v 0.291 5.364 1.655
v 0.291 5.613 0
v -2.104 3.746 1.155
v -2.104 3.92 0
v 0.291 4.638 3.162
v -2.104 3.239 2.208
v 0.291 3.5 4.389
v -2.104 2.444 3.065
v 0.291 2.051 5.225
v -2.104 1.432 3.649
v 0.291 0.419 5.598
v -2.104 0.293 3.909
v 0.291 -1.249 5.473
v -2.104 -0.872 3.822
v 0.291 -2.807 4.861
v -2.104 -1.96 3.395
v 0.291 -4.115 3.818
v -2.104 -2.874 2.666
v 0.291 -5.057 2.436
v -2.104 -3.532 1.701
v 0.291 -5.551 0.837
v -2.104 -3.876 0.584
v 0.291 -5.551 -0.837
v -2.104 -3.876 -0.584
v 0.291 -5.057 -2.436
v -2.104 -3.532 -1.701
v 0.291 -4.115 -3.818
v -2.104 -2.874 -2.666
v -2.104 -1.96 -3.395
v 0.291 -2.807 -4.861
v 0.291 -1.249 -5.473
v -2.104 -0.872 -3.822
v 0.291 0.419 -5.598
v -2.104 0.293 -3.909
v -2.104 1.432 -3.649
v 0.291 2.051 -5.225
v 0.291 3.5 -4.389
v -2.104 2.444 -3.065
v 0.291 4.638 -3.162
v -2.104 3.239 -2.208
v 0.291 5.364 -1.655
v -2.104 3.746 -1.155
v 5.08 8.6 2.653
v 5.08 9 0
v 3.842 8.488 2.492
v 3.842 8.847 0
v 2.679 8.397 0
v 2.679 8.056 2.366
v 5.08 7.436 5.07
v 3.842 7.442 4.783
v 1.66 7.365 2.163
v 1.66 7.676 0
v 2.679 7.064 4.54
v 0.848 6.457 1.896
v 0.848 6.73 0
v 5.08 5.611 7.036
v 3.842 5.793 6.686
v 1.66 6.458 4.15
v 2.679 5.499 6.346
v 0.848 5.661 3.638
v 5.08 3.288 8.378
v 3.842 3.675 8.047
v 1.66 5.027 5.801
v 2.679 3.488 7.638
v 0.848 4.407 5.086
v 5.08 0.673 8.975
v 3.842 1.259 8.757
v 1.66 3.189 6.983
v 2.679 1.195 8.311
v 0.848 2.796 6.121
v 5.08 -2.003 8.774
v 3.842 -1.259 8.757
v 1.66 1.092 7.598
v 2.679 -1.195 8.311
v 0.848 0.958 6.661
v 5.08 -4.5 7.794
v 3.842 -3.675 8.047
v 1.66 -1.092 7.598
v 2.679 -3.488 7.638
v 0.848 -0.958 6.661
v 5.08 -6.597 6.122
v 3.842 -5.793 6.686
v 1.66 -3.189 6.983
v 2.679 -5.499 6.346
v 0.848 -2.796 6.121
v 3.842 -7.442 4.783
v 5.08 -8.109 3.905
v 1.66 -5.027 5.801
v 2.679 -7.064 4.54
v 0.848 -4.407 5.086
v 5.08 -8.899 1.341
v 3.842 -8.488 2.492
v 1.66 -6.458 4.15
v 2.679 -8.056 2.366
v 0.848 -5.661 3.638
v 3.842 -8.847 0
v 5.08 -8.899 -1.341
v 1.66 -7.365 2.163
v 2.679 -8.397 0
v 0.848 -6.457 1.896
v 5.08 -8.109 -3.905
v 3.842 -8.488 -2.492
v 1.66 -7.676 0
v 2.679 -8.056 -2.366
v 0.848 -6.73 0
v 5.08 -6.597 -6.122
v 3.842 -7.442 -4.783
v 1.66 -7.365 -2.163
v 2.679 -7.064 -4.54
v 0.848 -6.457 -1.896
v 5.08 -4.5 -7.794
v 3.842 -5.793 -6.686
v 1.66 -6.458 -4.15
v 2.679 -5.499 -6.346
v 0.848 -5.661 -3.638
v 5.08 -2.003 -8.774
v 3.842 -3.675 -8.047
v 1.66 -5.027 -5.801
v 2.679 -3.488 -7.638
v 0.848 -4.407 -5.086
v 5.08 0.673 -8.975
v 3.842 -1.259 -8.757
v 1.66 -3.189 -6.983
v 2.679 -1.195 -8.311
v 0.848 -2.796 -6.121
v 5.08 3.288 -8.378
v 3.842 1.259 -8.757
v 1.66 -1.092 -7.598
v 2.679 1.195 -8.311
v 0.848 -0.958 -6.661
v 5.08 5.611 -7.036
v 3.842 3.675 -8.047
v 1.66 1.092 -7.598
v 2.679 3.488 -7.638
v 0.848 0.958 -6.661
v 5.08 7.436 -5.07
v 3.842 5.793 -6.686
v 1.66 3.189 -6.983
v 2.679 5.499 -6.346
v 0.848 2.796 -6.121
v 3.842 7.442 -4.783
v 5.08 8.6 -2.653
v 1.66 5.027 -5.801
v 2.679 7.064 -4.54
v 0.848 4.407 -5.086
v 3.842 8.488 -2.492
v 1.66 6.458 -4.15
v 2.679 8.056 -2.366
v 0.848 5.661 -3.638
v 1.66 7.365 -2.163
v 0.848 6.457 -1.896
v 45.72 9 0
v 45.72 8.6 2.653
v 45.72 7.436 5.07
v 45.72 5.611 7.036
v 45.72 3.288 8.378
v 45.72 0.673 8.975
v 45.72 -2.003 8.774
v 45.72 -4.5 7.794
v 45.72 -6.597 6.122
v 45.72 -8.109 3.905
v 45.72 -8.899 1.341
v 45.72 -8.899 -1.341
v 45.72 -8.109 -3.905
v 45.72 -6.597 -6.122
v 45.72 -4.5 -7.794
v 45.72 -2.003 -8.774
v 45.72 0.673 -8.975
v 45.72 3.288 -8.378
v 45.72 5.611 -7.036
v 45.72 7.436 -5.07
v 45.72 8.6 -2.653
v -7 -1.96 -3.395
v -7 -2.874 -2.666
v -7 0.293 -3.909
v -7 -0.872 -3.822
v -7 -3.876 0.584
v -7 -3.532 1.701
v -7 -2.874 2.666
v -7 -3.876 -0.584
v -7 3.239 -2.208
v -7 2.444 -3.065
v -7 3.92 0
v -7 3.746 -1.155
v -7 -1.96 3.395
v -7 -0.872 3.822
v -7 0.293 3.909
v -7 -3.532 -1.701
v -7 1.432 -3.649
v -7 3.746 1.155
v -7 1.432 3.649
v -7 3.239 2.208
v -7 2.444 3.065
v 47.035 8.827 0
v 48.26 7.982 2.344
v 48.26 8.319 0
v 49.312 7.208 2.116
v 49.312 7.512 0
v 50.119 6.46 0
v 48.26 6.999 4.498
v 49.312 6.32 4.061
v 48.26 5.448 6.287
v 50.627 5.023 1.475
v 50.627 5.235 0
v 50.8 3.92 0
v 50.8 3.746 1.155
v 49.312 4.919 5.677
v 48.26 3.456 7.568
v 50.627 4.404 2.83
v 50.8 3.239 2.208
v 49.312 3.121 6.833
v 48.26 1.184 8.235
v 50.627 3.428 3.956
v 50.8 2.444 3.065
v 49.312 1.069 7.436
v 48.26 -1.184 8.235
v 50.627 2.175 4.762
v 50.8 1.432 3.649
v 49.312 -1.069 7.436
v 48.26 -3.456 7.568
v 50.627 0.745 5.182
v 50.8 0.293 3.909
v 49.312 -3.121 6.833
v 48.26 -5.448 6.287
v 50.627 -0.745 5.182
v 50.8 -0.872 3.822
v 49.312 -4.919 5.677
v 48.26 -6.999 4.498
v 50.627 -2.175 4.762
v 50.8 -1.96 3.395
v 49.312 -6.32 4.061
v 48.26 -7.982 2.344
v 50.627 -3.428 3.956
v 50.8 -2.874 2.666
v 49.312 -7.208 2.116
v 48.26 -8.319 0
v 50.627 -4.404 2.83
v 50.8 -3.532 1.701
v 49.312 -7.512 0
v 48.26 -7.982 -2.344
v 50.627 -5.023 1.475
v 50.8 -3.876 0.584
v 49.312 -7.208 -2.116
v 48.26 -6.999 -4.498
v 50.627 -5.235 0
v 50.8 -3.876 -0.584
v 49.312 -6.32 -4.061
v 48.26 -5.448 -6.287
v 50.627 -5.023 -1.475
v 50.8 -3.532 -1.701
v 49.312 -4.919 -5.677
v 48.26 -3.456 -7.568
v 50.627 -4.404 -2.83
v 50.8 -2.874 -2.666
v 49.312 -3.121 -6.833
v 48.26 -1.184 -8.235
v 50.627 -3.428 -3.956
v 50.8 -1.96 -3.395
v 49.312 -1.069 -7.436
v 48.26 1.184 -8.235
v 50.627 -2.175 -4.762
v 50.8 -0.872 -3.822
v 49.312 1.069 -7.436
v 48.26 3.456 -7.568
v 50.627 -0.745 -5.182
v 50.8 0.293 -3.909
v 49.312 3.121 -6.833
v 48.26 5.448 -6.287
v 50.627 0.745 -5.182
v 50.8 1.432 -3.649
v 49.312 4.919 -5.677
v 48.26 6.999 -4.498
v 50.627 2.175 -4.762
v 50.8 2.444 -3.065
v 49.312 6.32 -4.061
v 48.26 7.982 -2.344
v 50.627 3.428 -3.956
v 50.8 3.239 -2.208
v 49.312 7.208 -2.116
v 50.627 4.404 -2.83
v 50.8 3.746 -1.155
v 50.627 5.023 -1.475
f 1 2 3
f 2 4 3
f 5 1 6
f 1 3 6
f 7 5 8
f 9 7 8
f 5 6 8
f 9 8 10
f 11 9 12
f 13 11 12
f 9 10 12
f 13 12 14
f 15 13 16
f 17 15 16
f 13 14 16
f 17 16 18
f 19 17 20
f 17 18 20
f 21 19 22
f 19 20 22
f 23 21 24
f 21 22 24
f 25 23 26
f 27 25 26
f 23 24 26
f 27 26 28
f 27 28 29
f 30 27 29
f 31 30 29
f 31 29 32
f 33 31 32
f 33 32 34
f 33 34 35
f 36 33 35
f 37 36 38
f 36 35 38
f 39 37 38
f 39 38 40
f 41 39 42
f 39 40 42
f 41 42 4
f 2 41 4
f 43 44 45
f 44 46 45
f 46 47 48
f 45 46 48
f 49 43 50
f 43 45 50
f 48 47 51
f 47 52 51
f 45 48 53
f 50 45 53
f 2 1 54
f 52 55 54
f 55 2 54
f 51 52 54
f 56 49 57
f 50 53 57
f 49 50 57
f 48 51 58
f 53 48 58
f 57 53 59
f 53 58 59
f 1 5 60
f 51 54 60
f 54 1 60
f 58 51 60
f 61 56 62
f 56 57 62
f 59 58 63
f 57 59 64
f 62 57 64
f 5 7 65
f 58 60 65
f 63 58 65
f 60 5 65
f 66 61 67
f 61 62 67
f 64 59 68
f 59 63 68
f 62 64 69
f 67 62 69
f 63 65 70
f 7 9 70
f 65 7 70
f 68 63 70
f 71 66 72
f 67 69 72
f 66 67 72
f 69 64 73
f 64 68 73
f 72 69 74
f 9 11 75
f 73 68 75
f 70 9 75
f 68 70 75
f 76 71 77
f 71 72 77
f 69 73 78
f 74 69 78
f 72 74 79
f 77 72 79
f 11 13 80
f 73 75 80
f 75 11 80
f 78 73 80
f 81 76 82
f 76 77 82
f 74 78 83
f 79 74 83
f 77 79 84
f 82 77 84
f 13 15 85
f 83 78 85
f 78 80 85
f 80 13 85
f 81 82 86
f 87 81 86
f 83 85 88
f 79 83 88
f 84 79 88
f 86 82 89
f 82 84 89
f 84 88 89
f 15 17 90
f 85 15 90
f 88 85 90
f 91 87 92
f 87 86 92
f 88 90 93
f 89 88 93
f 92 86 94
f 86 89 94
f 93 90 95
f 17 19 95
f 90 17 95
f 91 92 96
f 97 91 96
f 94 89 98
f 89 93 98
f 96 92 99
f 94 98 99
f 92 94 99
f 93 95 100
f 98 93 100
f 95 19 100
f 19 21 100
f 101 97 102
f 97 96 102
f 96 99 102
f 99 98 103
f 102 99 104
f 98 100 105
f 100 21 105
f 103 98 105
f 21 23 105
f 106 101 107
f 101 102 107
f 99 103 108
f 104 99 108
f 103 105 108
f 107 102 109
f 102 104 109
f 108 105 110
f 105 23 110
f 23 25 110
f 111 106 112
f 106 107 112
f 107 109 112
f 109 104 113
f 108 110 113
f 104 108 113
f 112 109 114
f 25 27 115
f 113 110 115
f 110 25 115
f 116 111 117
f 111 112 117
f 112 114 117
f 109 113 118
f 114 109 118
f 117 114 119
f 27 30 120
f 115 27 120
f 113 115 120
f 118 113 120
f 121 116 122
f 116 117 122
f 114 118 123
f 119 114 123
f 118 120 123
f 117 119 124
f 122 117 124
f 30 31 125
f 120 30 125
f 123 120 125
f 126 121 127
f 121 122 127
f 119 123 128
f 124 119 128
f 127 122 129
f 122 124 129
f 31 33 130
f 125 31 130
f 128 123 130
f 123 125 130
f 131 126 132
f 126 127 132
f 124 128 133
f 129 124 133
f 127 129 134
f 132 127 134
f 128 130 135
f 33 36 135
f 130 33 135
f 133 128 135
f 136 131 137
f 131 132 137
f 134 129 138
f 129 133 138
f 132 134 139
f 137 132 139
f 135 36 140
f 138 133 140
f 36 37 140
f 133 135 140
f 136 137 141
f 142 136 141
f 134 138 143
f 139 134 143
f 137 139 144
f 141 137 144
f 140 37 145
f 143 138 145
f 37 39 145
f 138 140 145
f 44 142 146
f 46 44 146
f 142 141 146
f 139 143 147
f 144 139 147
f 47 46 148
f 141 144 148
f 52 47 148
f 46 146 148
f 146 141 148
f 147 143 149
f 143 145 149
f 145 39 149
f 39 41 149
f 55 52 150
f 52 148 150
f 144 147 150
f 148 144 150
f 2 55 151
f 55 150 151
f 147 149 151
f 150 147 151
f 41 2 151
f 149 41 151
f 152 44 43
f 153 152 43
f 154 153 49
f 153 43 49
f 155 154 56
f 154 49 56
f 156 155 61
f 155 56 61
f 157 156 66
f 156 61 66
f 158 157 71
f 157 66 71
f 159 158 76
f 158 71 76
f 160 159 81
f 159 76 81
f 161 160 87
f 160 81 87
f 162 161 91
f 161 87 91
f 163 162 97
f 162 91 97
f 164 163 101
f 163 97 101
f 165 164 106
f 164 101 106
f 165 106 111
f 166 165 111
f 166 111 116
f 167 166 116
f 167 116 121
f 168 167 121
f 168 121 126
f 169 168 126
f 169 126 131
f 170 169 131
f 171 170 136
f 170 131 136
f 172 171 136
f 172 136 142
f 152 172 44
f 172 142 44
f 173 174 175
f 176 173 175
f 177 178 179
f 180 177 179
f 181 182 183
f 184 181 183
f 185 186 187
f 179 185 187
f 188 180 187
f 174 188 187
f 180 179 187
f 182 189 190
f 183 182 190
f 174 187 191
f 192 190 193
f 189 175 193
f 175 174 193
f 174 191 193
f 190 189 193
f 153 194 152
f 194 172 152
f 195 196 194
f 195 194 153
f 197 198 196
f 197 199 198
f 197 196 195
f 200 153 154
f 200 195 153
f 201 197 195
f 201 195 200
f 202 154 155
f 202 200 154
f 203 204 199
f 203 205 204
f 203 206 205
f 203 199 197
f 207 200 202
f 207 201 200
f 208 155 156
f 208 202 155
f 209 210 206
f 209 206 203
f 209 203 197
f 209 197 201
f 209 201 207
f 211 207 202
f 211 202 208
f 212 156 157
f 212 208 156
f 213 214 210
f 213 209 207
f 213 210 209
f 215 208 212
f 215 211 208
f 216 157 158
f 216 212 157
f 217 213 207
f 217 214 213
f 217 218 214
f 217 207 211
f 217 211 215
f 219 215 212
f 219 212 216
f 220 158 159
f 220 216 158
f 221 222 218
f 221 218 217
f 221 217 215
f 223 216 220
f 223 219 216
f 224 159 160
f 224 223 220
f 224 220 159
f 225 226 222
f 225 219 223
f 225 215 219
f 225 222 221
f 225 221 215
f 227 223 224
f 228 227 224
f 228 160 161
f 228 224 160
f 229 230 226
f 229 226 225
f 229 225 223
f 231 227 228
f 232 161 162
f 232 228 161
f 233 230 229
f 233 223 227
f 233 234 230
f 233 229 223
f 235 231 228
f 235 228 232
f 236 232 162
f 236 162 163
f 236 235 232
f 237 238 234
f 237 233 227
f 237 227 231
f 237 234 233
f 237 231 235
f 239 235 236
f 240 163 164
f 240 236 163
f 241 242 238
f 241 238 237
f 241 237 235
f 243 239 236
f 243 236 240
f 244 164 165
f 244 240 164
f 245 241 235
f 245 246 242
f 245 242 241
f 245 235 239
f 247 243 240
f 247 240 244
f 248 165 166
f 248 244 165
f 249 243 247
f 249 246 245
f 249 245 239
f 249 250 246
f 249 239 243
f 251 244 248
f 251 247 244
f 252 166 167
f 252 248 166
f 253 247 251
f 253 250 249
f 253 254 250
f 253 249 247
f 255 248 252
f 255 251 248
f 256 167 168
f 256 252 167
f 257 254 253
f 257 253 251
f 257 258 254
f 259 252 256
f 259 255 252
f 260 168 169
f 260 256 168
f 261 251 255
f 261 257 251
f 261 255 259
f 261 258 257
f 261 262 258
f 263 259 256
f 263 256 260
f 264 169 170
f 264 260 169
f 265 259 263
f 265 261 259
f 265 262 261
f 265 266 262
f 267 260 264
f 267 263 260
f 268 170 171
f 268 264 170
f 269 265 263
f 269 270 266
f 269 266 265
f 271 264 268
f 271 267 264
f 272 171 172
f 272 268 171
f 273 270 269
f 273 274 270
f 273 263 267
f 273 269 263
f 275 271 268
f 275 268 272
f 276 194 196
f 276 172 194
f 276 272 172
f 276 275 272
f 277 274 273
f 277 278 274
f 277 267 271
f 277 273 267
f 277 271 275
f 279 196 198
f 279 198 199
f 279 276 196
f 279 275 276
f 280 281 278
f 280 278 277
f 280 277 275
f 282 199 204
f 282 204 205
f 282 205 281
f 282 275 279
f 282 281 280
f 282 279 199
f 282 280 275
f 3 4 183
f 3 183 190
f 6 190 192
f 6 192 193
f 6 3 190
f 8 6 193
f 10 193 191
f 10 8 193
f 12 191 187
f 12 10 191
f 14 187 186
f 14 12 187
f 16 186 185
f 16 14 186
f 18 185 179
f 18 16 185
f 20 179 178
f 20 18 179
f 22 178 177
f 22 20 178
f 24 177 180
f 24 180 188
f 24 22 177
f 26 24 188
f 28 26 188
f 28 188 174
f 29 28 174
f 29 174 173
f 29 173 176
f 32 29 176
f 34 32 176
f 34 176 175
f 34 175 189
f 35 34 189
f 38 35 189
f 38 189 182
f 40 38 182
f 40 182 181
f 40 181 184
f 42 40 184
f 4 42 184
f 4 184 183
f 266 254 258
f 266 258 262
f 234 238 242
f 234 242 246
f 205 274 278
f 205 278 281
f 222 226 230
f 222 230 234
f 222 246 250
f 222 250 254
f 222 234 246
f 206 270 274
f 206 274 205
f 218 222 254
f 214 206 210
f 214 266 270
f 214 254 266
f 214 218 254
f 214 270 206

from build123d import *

# Parameters (mm, degrees)
F0_R     = 9
F1_DEPTH = 50.8
F2_R     = 5.08
F3_DEPTH = 7


# Not quite as in the source:
# - a fillet or chamfer that OpenCascade refuses, or shapes differently, is made with other operations: its cross-section is extruded or revolved along the edge and cut away or added


with BuildPart() as f1:
    # F0 (on Right) → F1 (new body)
    with BuildSketch(Plane.YZ):
        Circle(F0_R)
    extrude(amount=F1_DEPTH)

    # F2
    f2_edges = [f1.edges().sort_by_distance(p)[0] for p in [
        (50.8, -9, 0),
        (0, -9, 0),
    ]]
    fillet(f2_edges, radius=F2_R)

    # F3 (add): a face of the model
    f3_faces = [f1.faces().sort_by_distance(p)[0] for p in [
        (0, 0, 0),
    ]]
    extrude(f3_faces, amount=F3_DEPTH)

    # F4: chamfer of 2.54 on 1 edges, made by hand

    # F4_s1 → F4_t2 (revolve)
    with BuildSketch(Plane.XY):
        with BuildLine():
            Line((0.2905300688, 5.6133333333), (-2.1042048969, 3.92))
            Line((-2.1042048969, 3.92), (0, 3.92))
            ThreePointArc((0, 3.92), (0.0794974837, 4.8151952776), (0.2905300688, 5.6133333333))
        make_face()
    revolve(axis=Axis((0, 0, 0), (1, 0, 0)))


solid = f1.part
